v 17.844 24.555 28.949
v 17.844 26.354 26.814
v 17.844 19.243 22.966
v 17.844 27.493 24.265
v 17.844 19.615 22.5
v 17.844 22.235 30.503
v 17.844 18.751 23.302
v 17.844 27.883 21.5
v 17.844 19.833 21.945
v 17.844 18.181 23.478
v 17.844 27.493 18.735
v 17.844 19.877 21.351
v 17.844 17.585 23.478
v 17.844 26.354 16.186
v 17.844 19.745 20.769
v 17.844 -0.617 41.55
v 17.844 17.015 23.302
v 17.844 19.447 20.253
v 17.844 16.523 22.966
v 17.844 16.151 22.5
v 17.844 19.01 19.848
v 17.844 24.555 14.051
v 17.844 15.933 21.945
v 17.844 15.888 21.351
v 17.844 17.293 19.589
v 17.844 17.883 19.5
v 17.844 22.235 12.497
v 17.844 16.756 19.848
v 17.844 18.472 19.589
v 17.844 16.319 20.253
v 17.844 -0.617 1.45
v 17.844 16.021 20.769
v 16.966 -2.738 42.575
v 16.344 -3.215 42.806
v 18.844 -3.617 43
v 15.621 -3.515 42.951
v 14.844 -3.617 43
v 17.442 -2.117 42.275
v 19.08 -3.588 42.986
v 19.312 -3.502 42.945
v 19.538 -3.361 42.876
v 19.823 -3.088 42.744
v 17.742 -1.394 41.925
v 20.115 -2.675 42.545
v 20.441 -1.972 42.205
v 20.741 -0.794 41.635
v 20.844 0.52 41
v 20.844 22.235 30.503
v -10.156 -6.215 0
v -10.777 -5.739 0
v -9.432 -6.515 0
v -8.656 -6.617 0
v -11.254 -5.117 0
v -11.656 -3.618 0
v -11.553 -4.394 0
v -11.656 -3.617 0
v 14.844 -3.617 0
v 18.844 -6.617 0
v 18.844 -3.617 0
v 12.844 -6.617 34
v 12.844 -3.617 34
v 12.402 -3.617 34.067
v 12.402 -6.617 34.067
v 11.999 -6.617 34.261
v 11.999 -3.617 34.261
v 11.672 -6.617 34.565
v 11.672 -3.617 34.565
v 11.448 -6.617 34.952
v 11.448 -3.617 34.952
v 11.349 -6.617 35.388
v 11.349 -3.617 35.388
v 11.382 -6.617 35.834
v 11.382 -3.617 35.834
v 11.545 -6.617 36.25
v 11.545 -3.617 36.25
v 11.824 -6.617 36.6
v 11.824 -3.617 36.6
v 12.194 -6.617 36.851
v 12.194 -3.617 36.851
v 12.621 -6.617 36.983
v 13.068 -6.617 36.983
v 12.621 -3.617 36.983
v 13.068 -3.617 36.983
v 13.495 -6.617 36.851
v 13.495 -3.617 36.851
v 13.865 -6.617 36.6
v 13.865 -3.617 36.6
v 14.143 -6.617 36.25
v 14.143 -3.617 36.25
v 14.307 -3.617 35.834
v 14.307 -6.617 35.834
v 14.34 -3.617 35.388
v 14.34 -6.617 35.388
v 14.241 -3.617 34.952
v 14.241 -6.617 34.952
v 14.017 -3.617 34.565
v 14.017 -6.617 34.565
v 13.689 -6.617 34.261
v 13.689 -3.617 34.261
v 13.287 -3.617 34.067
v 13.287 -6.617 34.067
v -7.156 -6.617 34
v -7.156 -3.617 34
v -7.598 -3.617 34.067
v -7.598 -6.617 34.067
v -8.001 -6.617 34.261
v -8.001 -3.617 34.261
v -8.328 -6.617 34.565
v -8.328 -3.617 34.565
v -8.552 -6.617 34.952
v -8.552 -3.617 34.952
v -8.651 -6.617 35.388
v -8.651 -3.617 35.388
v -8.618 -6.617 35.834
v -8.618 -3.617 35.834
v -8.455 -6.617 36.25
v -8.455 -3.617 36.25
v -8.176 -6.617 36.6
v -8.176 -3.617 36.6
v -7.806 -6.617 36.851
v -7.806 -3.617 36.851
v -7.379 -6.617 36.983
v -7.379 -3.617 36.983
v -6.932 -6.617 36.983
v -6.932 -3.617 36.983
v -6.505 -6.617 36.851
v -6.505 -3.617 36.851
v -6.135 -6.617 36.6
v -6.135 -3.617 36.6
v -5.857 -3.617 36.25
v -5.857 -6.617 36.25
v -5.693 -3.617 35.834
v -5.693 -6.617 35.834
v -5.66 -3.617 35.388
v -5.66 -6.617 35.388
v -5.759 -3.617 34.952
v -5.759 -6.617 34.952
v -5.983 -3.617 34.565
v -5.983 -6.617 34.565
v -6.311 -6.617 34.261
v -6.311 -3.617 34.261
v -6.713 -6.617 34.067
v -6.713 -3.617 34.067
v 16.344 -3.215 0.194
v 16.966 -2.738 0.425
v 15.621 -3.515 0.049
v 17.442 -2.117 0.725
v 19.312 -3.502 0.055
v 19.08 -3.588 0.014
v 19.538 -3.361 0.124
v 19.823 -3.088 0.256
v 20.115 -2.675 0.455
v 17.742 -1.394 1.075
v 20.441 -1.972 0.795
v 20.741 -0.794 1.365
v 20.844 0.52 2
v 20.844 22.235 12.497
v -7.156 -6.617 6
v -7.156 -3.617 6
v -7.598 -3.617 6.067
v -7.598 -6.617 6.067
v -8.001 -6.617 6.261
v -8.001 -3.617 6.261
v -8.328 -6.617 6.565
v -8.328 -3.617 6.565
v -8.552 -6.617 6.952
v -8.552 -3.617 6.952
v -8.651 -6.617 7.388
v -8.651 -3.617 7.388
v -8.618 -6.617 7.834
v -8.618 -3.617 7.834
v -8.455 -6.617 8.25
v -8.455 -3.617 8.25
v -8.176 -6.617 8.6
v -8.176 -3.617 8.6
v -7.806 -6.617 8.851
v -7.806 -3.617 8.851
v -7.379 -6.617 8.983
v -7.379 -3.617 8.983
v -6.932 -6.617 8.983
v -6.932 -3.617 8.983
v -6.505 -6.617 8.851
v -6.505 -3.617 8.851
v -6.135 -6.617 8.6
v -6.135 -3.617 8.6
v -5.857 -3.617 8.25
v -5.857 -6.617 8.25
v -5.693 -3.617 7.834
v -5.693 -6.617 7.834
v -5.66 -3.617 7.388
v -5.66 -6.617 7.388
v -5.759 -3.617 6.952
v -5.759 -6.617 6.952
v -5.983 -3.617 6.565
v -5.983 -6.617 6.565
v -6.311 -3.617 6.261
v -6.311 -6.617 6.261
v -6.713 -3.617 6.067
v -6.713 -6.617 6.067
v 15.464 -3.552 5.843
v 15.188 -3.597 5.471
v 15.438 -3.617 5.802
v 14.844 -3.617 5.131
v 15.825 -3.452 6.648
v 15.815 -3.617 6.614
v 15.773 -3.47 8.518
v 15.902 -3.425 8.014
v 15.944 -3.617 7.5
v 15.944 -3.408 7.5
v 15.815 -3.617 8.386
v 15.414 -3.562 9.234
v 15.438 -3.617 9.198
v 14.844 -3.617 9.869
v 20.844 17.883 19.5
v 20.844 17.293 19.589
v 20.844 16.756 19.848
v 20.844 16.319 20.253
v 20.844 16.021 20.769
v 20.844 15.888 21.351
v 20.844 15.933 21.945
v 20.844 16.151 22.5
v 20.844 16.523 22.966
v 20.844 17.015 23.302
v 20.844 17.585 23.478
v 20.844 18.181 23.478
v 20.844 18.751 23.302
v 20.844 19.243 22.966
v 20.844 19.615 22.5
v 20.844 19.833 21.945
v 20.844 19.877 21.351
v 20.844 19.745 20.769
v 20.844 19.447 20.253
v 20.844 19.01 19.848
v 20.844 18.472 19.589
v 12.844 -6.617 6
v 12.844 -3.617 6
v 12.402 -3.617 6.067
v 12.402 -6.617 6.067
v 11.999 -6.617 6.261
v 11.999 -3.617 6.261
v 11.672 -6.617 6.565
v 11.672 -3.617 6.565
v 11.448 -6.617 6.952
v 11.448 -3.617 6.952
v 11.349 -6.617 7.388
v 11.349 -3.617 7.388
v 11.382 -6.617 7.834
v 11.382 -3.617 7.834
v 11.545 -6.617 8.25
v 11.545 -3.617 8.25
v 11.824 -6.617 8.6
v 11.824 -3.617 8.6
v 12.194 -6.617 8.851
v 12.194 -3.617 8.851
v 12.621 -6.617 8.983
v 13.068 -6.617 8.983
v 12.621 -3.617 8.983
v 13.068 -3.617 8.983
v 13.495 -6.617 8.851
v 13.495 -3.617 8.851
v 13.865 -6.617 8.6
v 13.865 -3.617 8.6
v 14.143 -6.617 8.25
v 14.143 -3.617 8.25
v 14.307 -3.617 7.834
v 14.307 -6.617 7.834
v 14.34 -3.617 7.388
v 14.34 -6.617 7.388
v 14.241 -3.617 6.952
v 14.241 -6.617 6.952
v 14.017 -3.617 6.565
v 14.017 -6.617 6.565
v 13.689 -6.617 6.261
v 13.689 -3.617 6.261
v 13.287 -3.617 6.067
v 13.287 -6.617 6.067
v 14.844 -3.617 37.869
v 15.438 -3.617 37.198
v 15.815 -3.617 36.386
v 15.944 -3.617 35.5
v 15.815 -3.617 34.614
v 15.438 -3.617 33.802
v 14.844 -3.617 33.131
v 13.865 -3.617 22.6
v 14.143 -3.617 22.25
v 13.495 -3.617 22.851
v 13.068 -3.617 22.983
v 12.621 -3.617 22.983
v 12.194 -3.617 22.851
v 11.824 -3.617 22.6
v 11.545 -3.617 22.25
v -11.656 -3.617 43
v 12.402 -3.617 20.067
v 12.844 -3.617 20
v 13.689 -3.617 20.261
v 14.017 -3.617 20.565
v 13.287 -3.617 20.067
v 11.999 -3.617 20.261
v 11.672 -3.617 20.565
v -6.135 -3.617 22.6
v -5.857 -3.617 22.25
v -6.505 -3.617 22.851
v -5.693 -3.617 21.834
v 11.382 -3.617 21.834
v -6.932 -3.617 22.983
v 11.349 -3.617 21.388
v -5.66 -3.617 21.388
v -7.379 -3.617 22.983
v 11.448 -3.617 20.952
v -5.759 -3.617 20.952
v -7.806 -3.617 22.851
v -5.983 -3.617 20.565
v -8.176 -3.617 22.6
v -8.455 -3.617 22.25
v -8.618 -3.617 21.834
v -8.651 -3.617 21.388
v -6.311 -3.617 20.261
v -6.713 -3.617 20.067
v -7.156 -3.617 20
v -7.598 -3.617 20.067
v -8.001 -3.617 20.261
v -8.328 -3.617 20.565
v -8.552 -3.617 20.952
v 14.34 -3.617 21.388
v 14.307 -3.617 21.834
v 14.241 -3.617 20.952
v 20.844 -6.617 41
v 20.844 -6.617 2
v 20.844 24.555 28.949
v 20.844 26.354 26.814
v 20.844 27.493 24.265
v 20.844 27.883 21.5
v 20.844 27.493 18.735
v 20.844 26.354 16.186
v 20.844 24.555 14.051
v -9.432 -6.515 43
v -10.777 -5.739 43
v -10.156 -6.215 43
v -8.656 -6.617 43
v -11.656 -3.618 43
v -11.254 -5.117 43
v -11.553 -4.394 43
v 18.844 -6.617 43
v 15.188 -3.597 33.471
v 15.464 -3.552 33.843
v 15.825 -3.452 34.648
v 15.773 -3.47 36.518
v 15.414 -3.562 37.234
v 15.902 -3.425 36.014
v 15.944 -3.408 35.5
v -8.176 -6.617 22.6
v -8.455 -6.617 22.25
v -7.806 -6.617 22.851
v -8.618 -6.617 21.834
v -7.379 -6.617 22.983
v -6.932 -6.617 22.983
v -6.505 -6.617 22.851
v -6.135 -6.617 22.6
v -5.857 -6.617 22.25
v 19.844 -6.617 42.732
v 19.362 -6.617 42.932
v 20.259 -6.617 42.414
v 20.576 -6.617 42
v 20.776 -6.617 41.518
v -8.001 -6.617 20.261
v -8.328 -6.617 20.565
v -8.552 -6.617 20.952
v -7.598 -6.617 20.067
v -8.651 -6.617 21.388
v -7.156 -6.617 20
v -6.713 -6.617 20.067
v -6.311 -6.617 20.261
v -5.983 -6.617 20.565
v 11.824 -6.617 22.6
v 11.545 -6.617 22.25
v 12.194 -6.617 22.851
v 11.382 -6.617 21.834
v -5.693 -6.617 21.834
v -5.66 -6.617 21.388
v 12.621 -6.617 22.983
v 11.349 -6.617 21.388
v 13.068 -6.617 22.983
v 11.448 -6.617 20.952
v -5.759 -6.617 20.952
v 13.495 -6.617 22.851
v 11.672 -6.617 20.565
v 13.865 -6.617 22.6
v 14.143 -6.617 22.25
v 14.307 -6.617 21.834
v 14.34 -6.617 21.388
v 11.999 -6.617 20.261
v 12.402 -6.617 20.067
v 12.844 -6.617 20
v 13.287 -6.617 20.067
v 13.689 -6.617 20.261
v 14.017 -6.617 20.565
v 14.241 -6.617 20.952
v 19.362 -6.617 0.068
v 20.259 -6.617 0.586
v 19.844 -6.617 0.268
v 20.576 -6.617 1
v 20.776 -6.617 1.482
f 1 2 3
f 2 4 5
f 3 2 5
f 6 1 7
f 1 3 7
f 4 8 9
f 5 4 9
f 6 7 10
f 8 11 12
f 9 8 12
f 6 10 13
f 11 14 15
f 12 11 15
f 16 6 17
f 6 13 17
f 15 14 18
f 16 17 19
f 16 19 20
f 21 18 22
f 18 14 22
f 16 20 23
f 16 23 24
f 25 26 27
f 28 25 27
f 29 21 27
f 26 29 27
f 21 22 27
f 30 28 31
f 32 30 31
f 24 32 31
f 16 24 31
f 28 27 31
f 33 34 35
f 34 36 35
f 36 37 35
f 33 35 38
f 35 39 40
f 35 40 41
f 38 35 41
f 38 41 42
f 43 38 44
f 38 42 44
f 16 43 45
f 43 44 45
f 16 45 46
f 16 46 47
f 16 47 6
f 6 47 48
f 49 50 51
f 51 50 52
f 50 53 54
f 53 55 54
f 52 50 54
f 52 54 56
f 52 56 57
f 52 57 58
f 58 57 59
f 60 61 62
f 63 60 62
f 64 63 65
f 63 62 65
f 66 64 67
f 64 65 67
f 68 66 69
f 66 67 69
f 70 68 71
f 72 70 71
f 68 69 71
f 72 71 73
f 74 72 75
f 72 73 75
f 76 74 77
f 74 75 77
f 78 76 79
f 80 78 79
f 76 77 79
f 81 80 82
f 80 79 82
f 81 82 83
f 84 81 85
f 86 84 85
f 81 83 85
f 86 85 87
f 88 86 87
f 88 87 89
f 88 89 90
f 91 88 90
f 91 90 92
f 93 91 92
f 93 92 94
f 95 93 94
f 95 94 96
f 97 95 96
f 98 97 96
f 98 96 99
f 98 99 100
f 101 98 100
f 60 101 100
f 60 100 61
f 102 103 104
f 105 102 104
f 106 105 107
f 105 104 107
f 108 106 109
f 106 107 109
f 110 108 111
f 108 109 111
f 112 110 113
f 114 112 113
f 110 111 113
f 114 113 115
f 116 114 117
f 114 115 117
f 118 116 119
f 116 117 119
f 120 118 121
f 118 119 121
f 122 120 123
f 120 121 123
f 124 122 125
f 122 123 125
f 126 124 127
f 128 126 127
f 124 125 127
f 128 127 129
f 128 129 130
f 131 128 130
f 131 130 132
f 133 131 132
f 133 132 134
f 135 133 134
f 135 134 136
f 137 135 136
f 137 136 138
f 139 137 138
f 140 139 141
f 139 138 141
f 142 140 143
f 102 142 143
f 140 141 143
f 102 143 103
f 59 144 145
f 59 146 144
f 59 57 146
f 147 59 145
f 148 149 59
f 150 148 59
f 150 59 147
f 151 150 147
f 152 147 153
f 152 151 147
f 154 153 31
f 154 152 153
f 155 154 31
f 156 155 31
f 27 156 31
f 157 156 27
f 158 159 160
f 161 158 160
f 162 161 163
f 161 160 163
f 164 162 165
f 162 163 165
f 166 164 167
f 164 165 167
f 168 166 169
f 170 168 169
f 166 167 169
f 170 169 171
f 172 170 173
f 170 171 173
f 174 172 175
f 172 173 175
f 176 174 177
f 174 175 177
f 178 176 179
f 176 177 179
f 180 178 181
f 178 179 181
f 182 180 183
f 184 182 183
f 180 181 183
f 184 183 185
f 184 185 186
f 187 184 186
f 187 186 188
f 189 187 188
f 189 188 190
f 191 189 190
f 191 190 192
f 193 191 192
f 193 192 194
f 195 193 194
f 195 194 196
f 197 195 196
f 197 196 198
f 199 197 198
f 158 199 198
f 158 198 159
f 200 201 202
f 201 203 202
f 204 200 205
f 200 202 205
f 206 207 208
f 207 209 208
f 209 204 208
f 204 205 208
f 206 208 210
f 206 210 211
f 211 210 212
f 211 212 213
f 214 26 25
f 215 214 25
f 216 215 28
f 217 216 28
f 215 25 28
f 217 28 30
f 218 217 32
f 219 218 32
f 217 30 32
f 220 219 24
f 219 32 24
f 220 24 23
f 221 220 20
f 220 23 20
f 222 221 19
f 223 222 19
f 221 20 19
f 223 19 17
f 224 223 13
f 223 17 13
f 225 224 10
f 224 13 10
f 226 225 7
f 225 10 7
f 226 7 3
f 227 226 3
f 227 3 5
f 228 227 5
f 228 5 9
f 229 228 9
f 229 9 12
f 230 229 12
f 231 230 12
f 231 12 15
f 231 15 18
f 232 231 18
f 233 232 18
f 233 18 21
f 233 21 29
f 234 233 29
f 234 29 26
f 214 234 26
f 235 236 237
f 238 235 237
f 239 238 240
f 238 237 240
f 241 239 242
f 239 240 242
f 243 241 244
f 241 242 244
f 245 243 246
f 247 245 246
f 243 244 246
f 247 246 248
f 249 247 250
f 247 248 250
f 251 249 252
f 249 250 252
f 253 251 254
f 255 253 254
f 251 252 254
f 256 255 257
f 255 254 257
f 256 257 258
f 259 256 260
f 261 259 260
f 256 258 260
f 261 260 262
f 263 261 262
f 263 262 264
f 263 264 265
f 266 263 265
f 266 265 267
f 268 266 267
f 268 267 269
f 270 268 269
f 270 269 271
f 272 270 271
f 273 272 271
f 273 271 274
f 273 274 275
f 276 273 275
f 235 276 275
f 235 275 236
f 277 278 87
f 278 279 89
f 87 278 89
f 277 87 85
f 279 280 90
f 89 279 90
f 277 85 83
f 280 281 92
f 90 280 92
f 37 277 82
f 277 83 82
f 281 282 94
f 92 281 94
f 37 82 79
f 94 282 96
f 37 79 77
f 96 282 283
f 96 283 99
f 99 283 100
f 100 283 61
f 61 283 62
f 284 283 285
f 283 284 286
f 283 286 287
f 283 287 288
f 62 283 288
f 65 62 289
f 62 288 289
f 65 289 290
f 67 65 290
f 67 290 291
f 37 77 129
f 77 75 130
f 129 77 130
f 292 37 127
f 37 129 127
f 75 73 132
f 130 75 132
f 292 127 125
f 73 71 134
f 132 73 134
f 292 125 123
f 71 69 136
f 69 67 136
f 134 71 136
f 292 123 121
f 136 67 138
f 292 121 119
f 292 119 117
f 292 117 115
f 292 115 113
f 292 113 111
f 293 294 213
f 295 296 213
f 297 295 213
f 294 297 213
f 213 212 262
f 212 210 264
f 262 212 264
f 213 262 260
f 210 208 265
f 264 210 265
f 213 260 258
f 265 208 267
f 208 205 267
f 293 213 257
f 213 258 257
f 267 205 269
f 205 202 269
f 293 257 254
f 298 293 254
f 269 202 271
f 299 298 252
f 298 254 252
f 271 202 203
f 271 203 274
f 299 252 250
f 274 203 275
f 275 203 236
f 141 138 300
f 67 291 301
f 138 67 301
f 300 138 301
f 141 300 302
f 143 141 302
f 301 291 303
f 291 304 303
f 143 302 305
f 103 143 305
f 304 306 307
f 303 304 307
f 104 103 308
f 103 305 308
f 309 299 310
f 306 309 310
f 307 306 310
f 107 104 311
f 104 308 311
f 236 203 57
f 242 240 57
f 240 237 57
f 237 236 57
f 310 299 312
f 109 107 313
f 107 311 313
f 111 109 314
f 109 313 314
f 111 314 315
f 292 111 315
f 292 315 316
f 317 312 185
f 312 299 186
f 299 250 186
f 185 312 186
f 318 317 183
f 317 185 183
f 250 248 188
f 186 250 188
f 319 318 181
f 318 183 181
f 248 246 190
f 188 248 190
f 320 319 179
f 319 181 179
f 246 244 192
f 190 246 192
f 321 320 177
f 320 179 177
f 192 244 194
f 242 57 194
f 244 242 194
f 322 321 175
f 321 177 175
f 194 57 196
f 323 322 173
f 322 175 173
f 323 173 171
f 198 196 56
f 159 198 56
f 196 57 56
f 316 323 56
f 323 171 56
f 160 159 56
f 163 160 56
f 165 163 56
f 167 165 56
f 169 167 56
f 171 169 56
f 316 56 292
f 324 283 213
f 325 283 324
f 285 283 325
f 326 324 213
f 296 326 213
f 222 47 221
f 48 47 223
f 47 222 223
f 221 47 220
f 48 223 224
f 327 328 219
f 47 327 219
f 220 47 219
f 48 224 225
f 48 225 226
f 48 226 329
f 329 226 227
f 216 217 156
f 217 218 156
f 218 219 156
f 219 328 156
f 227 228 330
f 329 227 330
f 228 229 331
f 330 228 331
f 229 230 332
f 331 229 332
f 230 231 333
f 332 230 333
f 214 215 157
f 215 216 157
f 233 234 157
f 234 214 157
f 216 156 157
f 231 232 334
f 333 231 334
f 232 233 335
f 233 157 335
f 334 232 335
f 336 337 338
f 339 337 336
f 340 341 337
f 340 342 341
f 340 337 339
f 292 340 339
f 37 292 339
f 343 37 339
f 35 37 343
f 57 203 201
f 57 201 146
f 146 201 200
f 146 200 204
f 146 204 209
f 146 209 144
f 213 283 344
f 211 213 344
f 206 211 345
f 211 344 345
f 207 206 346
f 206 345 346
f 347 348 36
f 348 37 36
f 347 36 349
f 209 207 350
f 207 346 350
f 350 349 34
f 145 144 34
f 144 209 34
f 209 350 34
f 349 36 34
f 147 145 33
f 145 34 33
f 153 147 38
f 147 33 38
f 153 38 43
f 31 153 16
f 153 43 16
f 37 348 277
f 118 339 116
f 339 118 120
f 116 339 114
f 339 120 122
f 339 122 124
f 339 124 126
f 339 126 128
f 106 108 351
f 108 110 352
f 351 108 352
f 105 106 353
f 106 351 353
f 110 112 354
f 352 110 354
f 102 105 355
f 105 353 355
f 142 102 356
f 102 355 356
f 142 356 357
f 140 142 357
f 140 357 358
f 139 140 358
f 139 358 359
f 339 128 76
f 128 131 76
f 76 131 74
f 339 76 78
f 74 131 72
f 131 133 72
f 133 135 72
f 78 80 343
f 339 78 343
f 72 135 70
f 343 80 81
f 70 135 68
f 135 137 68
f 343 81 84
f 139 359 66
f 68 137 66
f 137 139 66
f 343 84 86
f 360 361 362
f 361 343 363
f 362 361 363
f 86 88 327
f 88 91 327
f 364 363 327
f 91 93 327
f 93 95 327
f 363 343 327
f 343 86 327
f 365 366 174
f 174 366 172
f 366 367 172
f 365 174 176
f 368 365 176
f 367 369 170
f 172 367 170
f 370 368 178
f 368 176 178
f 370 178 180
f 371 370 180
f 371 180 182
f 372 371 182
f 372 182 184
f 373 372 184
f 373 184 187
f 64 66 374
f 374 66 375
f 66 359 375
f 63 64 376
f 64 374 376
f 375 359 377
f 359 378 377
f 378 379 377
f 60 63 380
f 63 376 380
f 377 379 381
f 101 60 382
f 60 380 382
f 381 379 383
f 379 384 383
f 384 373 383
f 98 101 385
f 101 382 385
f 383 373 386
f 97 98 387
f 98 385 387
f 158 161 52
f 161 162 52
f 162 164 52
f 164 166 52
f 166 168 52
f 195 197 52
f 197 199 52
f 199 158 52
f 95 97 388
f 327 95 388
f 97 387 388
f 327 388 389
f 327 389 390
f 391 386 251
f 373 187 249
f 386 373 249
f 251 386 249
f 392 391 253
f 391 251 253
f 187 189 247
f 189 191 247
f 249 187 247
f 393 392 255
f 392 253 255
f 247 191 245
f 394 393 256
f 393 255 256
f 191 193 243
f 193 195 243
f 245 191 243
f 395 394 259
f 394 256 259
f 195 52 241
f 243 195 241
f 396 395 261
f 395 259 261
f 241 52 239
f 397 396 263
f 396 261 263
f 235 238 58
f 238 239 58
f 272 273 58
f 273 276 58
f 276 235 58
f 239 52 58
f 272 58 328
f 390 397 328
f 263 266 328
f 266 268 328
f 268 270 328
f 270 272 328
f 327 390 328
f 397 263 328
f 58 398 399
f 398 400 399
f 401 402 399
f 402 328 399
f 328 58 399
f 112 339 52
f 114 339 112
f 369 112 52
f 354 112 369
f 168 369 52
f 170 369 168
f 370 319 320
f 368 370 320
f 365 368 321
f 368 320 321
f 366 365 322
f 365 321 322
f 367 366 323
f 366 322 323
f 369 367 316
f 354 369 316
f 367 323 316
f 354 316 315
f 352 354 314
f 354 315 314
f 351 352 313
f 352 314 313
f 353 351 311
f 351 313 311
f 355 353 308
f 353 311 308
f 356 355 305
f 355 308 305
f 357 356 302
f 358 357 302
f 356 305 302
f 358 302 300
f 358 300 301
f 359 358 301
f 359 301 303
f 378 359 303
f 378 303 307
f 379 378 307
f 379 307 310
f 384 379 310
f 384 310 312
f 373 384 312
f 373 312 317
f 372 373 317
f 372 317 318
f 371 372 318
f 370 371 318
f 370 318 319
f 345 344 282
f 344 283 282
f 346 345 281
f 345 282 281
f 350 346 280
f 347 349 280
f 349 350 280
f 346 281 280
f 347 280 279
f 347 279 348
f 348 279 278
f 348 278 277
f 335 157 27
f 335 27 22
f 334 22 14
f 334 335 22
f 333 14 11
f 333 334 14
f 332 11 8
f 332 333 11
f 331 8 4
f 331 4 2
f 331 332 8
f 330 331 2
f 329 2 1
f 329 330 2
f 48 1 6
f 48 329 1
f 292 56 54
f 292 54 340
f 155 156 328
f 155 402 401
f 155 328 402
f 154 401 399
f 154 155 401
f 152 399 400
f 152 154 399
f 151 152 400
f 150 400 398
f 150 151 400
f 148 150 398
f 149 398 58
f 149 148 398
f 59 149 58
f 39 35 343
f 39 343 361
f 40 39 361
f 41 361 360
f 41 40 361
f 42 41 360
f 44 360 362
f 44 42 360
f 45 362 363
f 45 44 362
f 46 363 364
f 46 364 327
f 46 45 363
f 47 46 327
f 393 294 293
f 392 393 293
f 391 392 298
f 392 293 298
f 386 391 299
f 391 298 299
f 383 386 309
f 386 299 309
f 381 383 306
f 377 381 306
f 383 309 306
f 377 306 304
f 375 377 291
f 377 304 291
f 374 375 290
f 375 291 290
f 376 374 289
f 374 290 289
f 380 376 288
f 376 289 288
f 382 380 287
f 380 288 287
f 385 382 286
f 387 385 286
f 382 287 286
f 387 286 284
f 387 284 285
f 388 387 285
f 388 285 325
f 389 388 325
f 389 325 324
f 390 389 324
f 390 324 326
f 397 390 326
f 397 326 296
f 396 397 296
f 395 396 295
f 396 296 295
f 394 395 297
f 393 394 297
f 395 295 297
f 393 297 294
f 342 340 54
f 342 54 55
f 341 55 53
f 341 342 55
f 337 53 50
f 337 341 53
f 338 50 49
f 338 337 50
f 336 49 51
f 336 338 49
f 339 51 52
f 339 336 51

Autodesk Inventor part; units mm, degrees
ref_plane "YZ Plane" through (0, 0, 0) normal (1, 0, 0) x (0, 1, 0)
ref_plane "XZ Plane" through (0, 0, 0) normal (0, 1, 0) x (-1, 0, 0)
ref_plane "XY Plane" through (0, 0, 0) normal (0, 0, 1) x (1, 0, 0)
sketch "Szkic1" plane through (0, 0, 0) normal (0, 0, 1) x (1, 0, 0)
  line L0 (-15.1556, -3.6171) -> (-15.1556, -6.6171)
  line L1 (-15.1556, -6.6171) -> (20.8444, -6.6171)
  line L2 (20.8444, -6.6171) -> (20.8444, 40.3829)
  line L3 (20.8444, 40.3829) -> (17.8444, 40.3829)
  line L4 (17.8444, 40.3829) -> (17.8444, -3.6171)
  line L5 (17.8444, -3.6171) -> (-15.1556, -3.6171)
  point P0 (0, 0)
  dimension "d0" = 3
  dimension "d1" = 36
  dimension "d2" = 47
  dimension "d3" = 3
extrude "Wyciągnięcie proste1" add sketch "Szkic1" along normal blind 43
fillet "Zaokrąglenie1" radius 3 1 edges at (17.8444, -3.6171, 21.5)
fillet "Zaokrąglenie2" radius 3 2 edges at (-15.1556, -5.1171, 0) (-15.1556, -5.1171, 43)
sketch "Szkic3" plane through (20.8444, -6.6171, 0) normal (0, -1, 0) x (1, 0, 0)
  arc A0 (-33, 43) -> (-36, 40) centre (-33, 40) ccw projected
  line L0 (-36, 3) -> (-36, 40) projected
  arc A1 (-36, 3) -> (-33, 0) centre (-33, 3) ccw projected
  line L1 (-33, 0) -> (0, 0) projected
  line L2 (0, 0) -> (0, 43) projected
  line L3 (-33, 43) -> (0, 43) projected
  point P0 (-20.8444, 0)
  point P1 (-28, 35.5)
  point P2 (-8, 35.5)
  point P3 (-28, 7.5)
  point P4 (-8, 7.5)
  dimension "d40" = 20
  dimension "d41" = 20
  dimension "d42" = 36
  dimension "d43" = 8
  dimension "d44" = 8
  dimension "d45" = 7.5
  dimension "d46" = 7.5
  dimension "d47" = 7.5
  dimension "d48" = 7.5
hole "Otwór3" at (-7.1556, -6.6171, 35.5) at (12.8444, -6.6171, 35.5) at (-7.1556, -6.6171, 7.5) at (12.8444, -6.6171, 7.5) direction (0, 1, 0) diameter 3 end through all
sketch "Szkic4" plane through (20.8444, -6.6171, 0) normal (1, 0, 0) x (0, 0, -1)
  line L0 (0, 0) -> (0, 47) projected
  line L1 (0, 47) -> (-43, 47) projected
  line L2 (-43, 0) -> (-43, 47) projected
  line L3 (0, 0) -> (-43, 0) projected
  line L4 (0, 3) -> (-43, 3) projected
  circle A0 centre (-21.5, 24.5) radius 10
  line L5 (-43, 3) -> (-30.5033, 28.8521)
  line L6 (0, 3) -> (-12.4967, 28.8521)
  point P0 (0, 6.6171)
  dimension "d57" = 43
  dimension "d58" = 21.5
  dimension "d59" = 24.5
  dimension "d60" = 20
extrude "Wyciągnięcie proste4" cut sketch "Szkic4" against normal blind 10 contours L6 A0 L5 L2 L1 L0
hole "Otwór4" at (20.8444, 17.8829, 21.5) direction (-1, 0, 0) diameter 4 end through all
sketch "Szkic5" plane through (-15.1556, -3.6171, 40) normal (0, 1, 0) x (1, 0, 0)
  circle A0 centre (28, 4.5) radius 1.5 projected
  circle A1 centre (28, 32.5) radius 1.5 projected
  circle A2 centre (28, 4.5) radius 3.1
  circle A3 centre (28, 32.5) radius 1.5 projected
  circle A4 centre (28, 32.5) radius 3.1
  point P0 (15.1556, 40)
  dimension "d70" = 6.2
  dimension "d71" = 6.2
extrude "Wyciągnięcie proste5" cut sketch "Szkic5" along normal blind 10
sketch "Szkic6" plane through (-15.1556, -3.6171, 40) normal (0, 1, 0) x (1, 0, 0)
  circle A0 centre (28, 4.5) radius 1.5 projected
  circle A1 centre (28, 32.5) radius 1.5 projected
  line L0 (30, 30.1315) -> (30, 6.8685) projected
  arc A2 (30, 30.1315) -> (30, 34.8685) centre (28, 32.5) ccw projected
  line L1 (30, 40) -> (30, 34.8685) projected
  line L2 (30, 40) -> (3, 40) projected
  arc A3 (3, 40) -> (0, 37) centre (3, 37) ccw projected
  line L3 (0, 37) -> (0, 0) projected
  arc A4 (0, 0) -> (3, -3) centre (3, 0) ccw projected
  line L4 (30, -3) -> (3, -3) projected
  line L5 (30, 2.1315) -> (30, -3) projected
  arc A5 (30, 2.1315) -> (30, 6.8685) centre (28, 4.5) ccw projected
  circle A6 centre (8, 4.5) radius 1.5 projected
  circle A7 centre (8, 32.5) radius 1.5 projected
  line L6 (30, 40) -> (3, 40) projected
  line L7 (3.5, 40) -> (3.5, -3)
  line L8 (30, -3) -> (3, -3) projected
  point P0 (15.1556, 40)
  dimension "d74" = 3.5
extrude "Wyciągnięcie proste6" cut sketch "Szkic6" against normal through all contours L7 L4 A4 L3 A3 L2
fillet "Zaokrąglenie3" radius 2 2 edges at (20.8444, -5.1171, 43) (20.8444, -5.1171, 0)
sketch "Szkic7" plane through (20.8444, -6.6171, 2) normal (0, -1, 0) x (1, 0, 0)
  circle A0 centre (-28, 5.5) radius 1.5 projected
  circle A1 centre (-28, 33.5) radius 1.5 projected
  circle A2 centre (-8, 33.5) radius 1.5 projected
  circle A3 centre (-8, 5.5) radius 1.5 projected
  arc A4 (-2, -2) -> (0, 0) centre (-2, 0) ccw projected
  line L0 (0, 0) -> (0, 39) projected
  arc A5 (0, 39) -> (-2, 41) centre (-2, 39) ccw projected
  line L1 (-32.5, 41) -> (-2, 41) projected
  line L2 (-32.5, 41) -> (-32.5, -2) projected
  line L3 (-32.5, -2) -> (-2, -2) projected
  point P0 (-20.8444, -2)
  point P1 (-28, 19.5)
  point P2 (-8, 19.5)
  dimension "d79" = 14
  dimension "d80" = 14
  dimension "d81" = 14
  dimension "d82" = 14
fillet "Zaokrąglenie4" radius 3 1 edges at (-11.6556, -6.6171, 21.5)
hole "Otwór5" at (-7.1556, -6.6171, 21.5) at (12.8444, -6.6171, 21.5) direction (0, 1, 0) diameter 3 end through all
equation "\"d41\" = d40"
equation "\"d43\" = -0.5 * d40 + 0.5 * d42"
equation "\"d44\" = d43"
equation "\"d46\" = d45"
equation "\"d47\" = d45"
equation "\"d48\" = d47"
equation "\"d58\" = 0.5 * d57"
properties part number "CNCM_ALU_X_Axis_Idler_Mounting_Bracket_Stiffener"
